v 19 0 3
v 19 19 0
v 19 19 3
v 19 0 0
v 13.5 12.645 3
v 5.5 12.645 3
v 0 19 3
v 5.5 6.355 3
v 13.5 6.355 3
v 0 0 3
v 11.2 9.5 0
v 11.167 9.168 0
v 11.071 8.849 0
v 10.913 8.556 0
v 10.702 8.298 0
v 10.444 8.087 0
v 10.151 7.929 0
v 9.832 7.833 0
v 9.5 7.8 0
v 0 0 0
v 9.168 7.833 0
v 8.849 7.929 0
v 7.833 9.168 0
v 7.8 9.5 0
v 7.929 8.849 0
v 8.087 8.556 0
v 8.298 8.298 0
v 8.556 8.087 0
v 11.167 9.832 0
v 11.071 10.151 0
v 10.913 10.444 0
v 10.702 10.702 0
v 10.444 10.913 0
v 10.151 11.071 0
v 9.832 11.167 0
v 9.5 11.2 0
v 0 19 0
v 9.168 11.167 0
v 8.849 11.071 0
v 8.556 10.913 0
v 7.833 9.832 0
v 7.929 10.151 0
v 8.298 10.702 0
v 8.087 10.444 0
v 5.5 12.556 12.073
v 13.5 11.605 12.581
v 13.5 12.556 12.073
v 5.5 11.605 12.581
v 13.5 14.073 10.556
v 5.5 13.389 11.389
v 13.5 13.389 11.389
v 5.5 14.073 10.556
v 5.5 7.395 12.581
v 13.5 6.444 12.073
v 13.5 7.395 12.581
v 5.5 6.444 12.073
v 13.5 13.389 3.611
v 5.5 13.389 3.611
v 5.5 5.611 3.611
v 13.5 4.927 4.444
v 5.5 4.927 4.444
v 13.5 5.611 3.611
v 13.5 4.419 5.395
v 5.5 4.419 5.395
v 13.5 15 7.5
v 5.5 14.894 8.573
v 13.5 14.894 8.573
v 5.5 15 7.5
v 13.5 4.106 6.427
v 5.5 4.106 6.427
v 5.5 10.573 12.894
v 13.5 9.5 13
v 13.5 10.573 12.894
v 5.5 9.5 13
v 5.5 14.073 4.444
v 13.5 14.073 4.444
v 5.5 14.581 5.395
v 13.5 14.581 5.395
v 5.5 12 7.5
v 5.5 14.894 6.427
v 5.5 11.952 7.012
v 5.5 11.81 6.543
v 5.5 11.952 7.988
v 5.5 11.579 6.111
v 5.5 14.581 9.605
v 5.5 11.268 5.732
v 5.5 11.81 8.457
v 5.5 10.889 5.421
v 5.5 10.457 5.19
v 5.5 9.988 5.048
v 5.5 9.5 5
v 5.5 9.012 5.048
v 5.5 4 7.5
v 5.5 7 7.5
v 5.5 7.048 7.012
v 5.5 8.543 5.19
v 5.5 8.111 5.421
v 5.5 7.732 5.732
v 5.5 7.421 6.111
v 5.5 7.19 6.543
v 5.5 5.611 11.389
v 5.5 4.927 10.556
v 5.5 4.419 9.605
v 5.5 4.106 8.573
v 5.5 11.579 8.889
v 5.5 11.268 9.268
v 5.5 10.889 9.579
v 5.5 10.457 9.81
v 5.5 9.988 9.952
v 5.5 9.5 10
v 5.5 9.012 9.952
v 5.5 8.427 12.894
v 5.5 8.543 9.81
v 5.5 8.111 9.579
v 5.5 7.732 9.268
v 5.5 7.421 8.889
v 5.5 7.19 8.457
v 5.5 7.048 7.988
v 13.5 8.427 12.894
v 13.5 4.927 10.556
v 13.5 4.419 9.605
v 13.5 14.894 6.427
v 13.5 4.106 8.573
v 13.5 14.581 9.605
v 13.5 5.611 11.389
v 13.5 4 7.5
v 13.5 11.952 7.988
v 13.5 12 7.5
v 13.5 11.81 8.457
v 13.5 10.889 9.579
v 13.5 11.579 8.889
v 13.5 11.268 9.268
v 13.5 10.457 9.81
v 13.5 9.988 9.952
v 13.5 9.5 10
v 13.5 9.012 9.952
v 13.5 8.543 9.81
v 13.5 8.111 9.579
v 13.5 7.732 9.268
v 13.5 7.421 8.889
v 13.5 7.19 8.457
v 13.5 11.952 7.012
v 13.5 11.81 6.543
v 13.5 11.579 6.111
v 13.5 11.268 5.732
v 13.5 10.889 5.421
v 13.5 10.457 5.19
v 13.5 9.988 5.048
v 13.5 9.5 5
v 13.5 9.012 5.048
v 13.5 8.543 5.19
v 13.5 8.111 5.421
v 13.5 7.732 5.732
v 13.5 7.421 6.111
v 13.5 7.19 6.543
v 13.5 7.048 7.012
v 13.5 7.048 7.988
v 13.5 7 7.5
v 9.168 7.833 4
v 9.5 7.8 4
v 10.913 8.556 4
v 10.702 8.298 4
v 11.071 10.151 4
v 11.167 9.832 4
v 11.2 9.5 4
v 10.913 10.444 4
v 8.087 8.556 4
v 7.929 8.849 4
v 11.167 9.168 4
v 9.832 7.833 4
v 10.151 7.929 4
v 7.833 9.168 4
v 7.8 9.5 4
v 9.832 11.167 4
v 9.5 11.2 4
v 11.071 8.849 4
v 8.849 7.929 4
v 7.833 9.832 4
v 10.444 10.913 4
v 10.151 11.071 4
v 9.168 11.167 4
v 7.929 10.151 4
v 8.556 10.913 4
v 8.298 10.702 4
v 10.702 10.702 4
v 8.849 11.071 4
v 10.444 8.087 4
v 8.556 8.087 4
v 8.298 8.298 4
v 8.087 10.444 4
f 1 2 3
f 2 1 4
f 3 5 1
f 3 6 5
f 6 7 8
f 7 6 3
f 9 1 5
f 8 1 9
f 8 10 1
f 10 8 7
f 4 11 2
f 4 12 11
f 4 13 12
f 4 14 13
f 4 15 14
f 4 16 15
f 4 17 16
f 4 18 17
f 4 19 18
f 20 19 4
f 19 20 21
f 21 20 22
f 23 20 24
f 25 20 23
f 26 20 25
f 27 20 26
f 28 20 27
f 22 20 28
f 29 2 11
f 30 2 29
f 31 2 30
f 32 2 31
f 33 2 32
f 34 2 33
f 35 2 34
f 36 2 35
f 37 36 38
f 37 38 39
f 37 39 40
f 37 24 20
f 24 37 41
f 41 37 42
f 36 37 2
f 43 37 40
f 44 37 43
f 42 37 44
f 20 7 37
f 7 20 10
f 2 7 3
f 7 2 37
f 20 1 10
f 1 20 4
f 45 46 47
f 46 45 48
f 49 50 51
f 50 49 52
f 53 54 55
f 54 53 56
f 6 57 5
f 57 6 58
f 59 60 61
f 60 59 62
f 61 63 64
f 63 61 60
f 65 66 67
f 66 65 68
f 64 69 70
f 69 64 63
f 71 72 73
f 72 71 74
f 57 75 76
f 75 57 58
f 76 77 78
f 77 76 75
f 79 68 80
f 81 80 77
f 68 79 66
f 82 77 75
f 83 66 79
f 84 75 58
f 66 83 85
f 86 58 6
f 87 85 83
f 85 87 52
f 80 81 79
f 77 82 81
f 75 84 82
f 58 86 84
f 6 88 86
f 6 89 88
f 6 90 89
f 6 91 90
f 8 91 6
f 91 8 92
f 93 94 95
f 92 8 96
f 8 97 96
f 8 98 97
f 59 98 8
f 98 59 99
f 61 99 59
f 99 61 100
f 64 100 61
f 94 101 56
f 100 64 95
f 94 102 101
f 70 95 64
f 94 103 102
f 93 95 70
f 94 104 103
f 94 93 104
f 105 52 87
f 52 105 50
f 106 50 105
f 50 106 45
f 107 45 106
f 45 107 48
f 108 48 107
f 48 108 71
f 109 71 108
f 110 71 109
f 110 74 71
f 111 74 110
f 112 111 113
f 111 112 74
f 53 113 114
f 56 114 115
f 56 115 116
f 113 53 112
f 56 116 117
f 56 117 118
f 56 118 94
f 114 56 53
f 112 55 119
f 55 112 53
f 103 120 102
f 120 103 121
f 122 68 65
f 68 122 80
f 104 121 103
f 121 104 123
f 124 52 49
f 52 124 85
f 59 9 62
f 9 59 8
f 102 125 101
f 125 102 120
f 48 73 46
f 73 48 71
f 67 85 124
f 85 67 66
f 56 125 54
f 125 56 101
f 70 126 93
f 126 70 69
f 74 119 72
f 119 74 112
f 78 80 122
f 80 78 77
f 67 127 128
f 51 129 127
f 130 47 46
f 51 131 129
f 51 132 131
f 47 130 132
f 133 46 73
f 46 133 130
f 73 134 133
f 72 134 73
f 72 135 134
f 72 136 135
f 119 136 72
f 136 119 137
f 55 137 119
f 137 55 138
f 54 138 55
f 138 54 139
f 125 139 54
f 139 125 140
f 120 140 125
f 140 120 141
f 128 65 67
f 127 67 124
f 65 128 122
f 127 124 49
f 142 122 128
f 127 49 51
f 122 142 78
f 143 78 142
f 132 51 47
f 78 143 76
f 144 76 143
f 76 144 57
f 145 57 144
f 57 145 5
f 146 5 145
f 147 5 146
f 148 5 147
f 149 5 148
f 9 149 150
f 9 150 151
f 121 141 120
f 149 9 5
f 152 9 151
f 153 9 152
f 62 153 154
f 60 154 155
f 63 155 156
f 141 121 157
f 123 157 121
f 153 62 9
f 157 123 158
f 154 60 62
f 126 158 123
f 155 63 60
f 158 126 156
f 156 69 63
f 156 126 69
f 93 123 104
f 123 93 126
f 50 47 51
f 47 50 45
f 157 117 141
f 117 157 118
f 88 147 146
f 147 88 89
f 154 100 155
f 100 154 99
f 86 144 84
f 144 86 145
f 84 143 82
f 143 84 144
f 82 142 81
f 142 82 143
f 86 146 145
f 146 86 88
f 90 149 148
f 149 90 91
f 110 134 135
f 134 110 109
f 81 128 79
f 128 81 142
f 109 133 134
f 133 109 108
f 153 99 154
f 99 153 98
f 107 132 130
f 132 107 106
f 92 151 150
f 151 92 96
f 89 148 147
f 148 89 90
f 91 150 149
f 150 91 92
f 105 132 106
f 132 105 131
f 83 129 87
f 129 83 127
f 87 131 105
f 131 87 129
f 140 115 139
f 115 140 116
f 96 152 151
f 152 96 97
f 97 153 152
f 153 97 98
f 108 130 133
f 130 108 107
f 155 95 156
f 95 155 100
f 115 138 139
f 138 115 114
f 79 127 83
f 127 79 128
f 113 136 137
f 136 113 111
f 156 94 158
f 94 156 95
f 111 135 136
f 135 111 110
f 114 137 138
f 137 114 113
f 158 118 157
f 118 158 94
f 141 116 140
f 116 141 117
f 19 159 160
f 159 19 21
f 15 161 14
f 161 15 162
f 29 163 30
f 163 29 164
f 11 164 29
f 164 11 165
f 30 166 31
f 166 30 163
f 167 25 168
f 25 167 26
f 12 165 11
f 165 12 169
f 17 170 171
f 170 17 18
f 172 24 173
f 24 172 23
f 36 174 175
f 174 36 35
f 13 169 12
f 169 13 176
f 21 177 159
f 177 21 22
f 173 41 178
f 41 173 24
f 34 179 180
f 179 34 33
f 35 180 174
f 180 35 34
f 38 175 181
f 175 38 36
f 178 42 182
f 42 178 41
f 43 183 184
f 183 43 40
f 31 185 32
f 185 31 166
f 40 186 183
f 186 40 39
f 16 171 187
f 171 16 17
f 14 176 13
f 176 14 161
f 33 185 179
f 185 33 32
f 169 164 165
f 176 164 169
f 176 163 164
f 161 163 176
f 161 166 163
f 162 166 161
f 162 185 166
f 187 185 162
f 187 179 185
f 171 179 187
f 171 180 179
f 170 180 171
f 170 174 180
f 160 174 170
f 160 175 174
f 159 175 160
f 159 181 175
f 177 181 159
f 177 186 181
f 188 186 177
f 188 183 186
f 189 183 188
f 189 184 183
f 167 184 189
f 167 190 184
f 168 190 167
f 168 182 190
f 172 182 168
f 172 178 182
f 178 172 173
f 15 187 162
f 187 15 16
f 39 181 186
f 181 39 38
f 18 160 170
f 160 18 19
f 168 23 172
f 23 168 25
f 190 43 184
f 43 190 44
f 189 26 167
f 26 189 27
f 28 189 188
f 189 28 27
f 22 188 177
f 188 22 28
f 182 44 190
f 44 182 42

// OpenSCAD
$fn = 32;

// ----------------------------------------------------------------------
// Cable clip: cable 5 mm, clamp 11 mm, base 19 mm
// ----------------------------------------------------------------------

// --- parameters (mm) ---
foot_w = 19;              // base length, X
foot_d = 19;              // base width, Y
foot_t = 3;               // base thickness
hose_seat_d = 11;         // clamp outside diameter
ring_t = 3;               // clamp wall
cable_d = 5;              // cable opening
ring_w = 8;               // clamp width along the cable
screw_d = 3.4;            // screw clearance
sink = 1;                 // overlap of the clamp into the base

module base() {
  cube([foot_w, foot_d, foot_t]);
}

module clamp() {
  translate([foot_w / 2, foot_d / 2, foot_t + hose_seat_d / 2 - sink]) rotate([0, 90, 0])
    cylinder(h = ring_w, d = hose_seat_d, center = true);
}

difference() {
  union() {
    base();
    clamp();
  }
  translate([foot_w / 2, foot_d / 2, foot_t + hose_seat_d / 2 - sink]) rotate([0, 90, 0]) translate([0, 0, -ring_w / 2 - 1]) cylinder(h = ring_w + 2, d = cable_d);
  translate([9.5, foot_d / 2, -1]) cylinder(h = foot_t + 2, d = screw_d);
}
